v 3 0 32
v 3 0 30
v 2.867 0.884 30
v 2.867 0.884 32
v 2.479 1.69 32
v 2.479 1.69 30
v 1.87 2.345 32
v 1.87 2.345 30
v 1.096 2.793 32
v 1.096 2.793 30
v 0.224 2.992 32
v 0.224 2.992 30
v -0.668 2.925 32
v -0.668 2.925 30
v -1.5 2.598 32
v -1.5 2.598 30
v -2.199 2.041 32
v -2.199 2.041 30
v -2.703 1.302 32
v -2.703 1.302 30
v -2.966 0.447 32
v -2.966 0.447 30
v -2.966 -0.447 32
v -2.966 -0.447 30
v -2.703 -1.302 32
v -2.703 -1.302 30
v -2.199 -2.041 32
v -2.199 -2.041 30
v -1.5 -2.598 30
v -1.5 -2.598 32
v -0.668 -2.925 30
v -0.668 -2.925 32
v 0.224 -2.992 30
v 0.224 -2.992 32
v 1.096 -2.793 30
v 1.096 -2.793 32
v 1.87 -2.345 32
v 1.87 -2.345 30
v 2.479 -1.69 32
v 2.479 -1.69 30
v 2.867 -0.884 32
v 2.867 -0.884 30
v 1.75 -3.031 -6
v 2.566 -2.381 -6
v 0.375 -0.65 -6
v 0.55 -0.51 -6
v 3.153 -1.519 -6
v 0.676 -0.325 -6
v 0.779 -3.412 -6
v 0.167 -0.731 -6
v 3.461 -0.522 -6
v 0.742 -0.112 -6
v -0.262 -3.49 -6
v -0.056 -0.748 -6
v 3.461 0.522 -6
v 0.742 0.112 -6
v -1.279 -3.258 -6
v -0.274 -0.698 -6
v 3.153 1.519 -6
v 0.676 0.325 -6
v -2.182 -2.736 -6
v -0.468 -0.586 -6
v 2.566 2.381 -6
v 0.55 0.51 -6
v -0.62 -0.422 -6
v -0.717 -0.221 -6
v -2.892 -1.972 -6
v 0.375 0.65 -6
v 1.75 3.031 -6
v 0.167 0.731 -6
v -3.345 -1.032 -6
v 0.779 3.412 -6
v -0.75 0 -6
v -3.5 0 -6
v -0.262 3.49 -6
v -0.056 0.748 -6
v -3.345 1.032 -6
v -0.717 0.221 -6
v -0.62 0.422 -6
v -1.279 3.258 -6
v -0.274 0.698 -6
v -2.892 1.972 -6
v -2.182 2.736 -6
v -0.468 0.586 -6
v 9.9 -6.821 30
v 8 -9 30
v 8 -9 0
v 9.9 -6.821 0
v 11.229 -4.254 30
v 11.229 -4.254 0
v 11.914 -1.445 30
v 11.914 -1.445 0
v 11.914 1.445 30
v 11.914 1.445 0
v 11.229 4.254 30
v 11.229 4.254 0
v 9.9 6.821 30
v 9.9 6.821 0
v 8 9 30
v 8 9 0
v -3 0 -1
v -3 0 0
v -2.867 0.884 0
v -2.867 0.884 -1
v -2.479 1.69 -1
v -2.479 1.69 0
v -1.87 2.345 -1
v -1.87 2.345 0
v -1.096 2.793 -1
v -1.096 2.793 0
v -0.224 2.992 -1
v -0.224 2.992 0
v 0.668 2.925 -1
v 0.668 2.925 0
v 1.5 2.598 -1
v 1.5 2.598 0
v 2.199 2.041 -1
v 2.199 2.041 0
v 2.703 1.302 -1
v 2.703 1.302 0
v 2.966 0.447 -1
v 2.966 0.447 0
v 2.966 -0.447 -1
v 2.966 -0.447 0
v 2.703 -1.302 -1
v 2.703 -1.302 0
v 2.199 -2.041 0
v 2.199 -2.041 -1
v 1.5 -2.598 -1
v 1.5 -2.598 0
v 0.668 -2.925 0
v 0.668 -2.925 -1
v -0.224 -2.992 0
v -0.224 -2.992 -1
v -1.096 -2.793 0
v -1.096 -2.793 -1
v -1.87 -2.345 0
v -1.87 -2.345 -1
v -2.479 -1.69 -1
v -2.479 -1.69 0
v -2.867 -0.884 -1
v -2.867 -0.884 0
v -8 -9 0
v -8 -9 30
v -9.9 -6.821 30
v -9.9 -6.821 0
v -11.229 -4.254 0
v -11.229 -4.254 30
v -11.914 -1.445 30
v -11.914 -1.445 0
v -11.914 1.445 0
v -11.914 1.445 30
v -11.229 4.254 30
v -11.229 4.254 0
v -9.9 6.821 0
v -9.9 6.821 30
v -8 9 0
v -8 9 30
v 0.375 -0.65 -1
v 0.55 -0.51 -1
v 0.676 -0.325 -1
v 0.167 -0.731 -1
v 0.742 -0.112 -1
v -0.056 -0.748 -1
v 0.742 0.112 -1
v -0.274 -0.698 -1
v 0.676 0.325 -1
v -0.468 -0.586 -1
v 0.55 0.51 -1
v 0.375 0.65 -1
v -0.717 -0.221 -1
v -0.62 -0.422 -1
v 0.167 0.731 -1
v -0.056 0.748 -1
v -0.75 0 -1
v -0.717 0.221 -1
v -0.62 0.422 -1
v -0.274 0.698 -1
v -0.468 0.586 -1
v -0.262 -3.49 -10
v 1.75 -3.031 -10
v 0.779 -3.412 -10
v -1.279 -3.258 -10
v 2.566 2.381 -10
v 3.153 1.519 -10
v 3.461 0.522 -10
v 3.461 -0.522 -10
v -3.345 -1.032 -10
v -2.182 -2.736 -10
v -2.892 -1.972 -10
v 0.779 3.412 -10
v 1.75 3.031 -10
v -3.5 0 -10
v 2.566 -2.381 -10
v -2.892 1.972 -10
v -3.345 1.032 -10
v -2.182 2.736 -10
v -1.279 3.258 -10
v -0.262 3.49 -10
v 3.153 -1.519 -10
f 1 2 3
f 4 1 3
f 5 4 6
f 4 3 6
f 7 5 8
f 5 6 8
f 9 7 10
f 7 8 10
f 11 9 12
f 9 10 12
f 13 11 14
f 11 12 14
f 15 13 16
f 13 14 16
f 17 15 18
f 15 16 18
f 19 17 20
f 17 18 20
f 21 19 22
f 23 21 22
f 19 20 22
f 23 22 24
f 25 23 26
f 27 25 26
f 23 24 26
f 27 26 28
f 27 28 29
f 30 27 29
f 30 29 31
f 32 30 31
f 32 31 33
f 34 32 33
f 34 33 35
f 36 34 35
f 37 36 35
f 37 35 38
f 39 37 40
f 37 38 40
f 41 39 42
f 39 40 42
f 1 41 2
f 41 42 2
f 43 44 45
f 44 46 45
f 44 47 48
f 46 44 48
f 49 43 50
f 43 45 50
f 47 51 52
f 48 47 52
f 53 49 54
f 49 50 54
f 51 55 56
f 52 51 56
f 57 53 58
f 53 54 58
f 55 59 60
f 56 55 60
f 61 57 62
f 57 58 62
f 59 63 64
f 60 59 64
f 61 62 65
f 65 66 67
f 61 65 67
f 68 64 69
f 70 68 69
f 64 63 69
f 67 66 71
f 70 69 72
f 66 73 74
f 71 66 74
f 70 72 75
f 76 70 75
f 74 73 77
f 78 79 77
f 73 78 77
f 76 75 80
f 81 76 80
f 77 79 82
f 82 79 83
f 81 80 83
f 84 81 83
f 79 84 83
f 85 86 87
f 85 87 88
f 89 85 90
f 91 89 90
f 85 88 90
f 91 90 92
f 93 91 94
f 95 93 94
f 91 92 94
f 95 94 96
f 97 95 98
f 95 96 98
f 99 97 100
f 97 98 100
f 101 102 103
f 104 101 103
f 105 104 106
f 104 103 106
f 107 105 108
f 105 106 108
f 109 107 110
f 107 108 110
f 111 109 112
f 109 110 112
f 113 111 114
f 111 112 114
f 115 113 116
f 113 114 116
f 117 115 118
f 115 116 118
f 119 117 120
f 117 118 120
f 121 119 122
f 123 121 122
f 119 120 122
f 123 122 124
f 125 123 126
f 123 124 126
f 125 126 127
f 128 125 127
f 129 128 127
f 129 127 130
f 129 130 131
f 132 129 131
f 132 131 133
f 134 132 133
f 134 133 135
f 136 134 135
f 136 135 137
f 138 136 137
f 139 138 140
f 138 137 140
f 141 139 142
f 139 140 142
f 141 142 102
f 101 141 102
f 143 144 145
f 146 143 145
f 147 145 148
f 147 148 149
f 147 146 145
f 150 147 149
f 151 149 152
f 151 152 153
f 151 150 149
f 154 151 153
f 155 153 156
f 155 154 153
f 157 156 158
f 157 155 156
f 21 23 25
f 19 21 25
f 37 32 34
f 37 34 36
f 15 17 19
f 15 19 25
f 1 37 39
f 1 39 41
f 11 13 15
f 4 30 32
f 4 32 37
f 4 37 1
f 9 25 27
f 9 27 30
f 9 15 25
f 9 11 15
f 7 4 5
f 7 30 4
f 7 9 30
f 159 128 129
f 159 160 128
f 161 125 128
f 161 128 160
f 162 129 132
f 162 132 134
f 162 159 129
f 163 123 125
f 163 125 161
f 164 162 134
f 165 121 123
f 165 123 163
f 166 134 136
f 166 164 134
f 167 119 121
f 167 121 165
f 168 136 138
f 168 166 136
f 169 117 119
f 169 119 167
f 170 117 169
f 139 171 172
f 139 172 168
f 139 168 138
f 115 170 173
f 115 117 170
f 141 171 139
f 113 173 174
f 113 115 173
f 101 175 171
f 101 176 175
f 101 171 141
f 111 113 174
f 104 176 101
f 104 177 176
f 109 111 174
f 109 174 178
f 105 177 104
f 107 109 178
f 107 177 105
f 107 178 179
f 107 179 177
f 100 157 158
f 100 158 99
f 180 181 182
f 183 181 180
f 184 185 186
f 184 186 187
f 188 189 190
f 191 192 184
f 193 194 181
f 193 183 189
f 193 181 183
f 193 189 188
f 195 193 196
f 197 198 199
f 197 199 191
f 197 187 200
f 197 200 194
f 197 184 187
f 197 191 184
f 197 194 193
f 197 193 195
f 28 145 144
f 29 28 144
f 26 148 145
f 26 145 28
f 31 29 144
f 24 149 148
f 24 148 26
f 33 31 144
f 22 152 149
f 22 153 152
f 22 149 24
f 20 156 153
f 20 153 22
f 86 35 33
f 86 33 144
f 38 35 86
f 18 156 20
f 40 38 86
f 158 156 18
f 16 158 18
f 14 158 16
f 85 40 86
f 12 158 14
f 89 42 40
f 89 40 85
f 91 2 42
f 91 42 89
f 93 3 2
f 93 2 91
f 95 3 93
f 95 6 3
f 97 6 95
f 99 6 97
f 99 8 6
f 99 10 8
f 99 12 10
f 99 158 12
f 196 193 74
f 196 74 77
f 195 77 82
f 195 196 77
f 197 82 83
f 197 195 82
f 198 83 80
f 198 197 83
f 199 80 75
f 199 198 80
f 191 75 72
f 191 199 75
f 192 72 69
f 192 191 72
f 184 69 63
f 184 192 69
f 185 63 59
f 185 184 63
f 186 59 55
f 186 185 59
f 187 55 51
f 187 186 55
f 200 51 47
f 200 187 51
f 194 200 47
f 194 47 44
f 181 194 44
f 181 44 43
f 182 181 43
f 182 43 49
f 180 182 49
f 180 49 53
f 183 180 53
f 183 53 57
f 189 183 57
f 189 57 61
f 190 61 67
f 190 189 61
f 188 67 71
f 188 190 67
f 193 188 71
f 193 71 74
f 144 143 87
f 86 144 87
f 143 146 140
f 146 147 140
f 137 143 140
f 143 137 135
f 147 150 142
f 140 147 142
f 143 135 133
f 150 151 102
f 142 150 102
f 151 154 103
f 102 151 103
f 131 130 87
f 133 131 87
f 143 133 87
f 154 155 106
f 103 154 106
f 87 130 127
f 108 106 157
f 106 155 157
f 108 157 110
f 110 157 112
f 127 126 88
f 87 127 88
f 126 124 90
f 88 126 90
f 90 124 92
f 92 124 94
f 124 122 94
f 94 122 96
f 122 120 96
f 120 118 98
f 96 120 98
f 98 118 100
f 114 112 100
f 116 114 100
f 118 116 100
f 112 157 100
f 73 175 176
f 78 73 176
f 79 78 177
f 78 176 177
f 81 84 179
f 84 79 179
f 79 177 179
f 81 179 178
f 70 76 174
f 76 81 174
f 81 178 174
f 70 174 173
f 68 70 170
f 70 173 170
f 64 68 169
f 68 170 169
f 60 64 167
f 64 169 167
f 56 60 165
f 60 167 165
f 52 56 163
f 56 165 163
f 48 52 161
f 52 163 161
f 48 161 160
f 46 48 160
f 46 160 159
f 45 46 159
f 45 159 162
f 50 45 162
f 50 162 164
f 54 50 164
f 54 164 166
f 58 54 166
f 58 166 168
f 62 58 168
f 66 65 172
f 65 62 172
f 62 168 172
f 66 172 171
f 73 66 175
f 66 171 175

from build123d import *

# Parameters (mm, degrees)
SKETCH1_W           = 16
SKETCH1_H           = 30
BOSS_EXTRUDE1_DEPTH = 9
SKETCH2_R           = 3
BOSS_EXTRUDE2_DEPTH = 1
SKETCH3_R           = 3
BOSS_EXTRUDE3_DEPTH = 2
BOSS_EXTRUDE4_DEPTH = 30
SKETCH6_R           = 0.75
BOSS_EXTRUDE5_DEPTH = 10
SKETCH7_R           = 3.5
BOSS_EXTRUDE6_DEPTH = 4


with BuildPart() as part:
    # Sketch1 → Boss-Extrude1 (new body, symmetric)
    with BuildSketch(Plane(origin=(0, 0, 0), x_dir=(1, 0, 0), z_dir=(0, 1, 0))):
        with Locations((0, -15)):
            Rectangle(SKETCH1_W, SKETCH1_H)
    extrude(amount=BOSS_EXTRUDE1_DEPTH, both=True)

    # Sketch2 → Boss-Extrude2 (add)
    with BuildSketch(Plane(origin=(0, 0, 0), x_dir=(-1, 0, 0), z_dir=(0, 0, -1))):
        Circle(SKETCH2_R)
    extrude(amount=BOSS_EXTRUDE2_DEPTH)

    # Sketch3 → Boss-Extrude3 (add)
    with BuildSketch(Plane.XY.offset(30)):
        Circle(SKETCH3_R)
    extrude(amount=BOSS_EXTRUDE3_DEPTH)

    # Sketch5 → Boss-Extrude4 (add)
    with BuildSketch(Plane.XY):
        with BuildLine():
            Line((8, 9), (8, -9))
            ThreePointArc((8, -9), (12, 0), (8, 9))
        make_face()
        with BuildLine():
            Line((-8, 9), (-8, -9))
            ThreePointArc((-8, -9), (-12, 0), (-8, 9))
        make_face()
    extrude(amount=BOSS_EXTRUDE4_DEPTH)

    # Sketch6 → Boss-Extrude5 (add)
    with BuildSketch(Plane(origin=(0, 0, 0), x_dir=(-1, 0, 0), z_dir=(0, 0, -1))):
        Circle(SKETCH6_R)
    extrude(amount=BOSS_EXTRUDE5_DEPTH)

    # Sketch7 → Boss-Extrude6 (add)
    with BuildSketch(Plane(origin=(0, 0, -10), x_dir=(-1, 0, 0), z_dir=(0, 0, -1))):
        Circle(SKETCH7_R)
    extrude(amount=-BOSS_EXTRUDE6_DEPTH)


solid = part.part
